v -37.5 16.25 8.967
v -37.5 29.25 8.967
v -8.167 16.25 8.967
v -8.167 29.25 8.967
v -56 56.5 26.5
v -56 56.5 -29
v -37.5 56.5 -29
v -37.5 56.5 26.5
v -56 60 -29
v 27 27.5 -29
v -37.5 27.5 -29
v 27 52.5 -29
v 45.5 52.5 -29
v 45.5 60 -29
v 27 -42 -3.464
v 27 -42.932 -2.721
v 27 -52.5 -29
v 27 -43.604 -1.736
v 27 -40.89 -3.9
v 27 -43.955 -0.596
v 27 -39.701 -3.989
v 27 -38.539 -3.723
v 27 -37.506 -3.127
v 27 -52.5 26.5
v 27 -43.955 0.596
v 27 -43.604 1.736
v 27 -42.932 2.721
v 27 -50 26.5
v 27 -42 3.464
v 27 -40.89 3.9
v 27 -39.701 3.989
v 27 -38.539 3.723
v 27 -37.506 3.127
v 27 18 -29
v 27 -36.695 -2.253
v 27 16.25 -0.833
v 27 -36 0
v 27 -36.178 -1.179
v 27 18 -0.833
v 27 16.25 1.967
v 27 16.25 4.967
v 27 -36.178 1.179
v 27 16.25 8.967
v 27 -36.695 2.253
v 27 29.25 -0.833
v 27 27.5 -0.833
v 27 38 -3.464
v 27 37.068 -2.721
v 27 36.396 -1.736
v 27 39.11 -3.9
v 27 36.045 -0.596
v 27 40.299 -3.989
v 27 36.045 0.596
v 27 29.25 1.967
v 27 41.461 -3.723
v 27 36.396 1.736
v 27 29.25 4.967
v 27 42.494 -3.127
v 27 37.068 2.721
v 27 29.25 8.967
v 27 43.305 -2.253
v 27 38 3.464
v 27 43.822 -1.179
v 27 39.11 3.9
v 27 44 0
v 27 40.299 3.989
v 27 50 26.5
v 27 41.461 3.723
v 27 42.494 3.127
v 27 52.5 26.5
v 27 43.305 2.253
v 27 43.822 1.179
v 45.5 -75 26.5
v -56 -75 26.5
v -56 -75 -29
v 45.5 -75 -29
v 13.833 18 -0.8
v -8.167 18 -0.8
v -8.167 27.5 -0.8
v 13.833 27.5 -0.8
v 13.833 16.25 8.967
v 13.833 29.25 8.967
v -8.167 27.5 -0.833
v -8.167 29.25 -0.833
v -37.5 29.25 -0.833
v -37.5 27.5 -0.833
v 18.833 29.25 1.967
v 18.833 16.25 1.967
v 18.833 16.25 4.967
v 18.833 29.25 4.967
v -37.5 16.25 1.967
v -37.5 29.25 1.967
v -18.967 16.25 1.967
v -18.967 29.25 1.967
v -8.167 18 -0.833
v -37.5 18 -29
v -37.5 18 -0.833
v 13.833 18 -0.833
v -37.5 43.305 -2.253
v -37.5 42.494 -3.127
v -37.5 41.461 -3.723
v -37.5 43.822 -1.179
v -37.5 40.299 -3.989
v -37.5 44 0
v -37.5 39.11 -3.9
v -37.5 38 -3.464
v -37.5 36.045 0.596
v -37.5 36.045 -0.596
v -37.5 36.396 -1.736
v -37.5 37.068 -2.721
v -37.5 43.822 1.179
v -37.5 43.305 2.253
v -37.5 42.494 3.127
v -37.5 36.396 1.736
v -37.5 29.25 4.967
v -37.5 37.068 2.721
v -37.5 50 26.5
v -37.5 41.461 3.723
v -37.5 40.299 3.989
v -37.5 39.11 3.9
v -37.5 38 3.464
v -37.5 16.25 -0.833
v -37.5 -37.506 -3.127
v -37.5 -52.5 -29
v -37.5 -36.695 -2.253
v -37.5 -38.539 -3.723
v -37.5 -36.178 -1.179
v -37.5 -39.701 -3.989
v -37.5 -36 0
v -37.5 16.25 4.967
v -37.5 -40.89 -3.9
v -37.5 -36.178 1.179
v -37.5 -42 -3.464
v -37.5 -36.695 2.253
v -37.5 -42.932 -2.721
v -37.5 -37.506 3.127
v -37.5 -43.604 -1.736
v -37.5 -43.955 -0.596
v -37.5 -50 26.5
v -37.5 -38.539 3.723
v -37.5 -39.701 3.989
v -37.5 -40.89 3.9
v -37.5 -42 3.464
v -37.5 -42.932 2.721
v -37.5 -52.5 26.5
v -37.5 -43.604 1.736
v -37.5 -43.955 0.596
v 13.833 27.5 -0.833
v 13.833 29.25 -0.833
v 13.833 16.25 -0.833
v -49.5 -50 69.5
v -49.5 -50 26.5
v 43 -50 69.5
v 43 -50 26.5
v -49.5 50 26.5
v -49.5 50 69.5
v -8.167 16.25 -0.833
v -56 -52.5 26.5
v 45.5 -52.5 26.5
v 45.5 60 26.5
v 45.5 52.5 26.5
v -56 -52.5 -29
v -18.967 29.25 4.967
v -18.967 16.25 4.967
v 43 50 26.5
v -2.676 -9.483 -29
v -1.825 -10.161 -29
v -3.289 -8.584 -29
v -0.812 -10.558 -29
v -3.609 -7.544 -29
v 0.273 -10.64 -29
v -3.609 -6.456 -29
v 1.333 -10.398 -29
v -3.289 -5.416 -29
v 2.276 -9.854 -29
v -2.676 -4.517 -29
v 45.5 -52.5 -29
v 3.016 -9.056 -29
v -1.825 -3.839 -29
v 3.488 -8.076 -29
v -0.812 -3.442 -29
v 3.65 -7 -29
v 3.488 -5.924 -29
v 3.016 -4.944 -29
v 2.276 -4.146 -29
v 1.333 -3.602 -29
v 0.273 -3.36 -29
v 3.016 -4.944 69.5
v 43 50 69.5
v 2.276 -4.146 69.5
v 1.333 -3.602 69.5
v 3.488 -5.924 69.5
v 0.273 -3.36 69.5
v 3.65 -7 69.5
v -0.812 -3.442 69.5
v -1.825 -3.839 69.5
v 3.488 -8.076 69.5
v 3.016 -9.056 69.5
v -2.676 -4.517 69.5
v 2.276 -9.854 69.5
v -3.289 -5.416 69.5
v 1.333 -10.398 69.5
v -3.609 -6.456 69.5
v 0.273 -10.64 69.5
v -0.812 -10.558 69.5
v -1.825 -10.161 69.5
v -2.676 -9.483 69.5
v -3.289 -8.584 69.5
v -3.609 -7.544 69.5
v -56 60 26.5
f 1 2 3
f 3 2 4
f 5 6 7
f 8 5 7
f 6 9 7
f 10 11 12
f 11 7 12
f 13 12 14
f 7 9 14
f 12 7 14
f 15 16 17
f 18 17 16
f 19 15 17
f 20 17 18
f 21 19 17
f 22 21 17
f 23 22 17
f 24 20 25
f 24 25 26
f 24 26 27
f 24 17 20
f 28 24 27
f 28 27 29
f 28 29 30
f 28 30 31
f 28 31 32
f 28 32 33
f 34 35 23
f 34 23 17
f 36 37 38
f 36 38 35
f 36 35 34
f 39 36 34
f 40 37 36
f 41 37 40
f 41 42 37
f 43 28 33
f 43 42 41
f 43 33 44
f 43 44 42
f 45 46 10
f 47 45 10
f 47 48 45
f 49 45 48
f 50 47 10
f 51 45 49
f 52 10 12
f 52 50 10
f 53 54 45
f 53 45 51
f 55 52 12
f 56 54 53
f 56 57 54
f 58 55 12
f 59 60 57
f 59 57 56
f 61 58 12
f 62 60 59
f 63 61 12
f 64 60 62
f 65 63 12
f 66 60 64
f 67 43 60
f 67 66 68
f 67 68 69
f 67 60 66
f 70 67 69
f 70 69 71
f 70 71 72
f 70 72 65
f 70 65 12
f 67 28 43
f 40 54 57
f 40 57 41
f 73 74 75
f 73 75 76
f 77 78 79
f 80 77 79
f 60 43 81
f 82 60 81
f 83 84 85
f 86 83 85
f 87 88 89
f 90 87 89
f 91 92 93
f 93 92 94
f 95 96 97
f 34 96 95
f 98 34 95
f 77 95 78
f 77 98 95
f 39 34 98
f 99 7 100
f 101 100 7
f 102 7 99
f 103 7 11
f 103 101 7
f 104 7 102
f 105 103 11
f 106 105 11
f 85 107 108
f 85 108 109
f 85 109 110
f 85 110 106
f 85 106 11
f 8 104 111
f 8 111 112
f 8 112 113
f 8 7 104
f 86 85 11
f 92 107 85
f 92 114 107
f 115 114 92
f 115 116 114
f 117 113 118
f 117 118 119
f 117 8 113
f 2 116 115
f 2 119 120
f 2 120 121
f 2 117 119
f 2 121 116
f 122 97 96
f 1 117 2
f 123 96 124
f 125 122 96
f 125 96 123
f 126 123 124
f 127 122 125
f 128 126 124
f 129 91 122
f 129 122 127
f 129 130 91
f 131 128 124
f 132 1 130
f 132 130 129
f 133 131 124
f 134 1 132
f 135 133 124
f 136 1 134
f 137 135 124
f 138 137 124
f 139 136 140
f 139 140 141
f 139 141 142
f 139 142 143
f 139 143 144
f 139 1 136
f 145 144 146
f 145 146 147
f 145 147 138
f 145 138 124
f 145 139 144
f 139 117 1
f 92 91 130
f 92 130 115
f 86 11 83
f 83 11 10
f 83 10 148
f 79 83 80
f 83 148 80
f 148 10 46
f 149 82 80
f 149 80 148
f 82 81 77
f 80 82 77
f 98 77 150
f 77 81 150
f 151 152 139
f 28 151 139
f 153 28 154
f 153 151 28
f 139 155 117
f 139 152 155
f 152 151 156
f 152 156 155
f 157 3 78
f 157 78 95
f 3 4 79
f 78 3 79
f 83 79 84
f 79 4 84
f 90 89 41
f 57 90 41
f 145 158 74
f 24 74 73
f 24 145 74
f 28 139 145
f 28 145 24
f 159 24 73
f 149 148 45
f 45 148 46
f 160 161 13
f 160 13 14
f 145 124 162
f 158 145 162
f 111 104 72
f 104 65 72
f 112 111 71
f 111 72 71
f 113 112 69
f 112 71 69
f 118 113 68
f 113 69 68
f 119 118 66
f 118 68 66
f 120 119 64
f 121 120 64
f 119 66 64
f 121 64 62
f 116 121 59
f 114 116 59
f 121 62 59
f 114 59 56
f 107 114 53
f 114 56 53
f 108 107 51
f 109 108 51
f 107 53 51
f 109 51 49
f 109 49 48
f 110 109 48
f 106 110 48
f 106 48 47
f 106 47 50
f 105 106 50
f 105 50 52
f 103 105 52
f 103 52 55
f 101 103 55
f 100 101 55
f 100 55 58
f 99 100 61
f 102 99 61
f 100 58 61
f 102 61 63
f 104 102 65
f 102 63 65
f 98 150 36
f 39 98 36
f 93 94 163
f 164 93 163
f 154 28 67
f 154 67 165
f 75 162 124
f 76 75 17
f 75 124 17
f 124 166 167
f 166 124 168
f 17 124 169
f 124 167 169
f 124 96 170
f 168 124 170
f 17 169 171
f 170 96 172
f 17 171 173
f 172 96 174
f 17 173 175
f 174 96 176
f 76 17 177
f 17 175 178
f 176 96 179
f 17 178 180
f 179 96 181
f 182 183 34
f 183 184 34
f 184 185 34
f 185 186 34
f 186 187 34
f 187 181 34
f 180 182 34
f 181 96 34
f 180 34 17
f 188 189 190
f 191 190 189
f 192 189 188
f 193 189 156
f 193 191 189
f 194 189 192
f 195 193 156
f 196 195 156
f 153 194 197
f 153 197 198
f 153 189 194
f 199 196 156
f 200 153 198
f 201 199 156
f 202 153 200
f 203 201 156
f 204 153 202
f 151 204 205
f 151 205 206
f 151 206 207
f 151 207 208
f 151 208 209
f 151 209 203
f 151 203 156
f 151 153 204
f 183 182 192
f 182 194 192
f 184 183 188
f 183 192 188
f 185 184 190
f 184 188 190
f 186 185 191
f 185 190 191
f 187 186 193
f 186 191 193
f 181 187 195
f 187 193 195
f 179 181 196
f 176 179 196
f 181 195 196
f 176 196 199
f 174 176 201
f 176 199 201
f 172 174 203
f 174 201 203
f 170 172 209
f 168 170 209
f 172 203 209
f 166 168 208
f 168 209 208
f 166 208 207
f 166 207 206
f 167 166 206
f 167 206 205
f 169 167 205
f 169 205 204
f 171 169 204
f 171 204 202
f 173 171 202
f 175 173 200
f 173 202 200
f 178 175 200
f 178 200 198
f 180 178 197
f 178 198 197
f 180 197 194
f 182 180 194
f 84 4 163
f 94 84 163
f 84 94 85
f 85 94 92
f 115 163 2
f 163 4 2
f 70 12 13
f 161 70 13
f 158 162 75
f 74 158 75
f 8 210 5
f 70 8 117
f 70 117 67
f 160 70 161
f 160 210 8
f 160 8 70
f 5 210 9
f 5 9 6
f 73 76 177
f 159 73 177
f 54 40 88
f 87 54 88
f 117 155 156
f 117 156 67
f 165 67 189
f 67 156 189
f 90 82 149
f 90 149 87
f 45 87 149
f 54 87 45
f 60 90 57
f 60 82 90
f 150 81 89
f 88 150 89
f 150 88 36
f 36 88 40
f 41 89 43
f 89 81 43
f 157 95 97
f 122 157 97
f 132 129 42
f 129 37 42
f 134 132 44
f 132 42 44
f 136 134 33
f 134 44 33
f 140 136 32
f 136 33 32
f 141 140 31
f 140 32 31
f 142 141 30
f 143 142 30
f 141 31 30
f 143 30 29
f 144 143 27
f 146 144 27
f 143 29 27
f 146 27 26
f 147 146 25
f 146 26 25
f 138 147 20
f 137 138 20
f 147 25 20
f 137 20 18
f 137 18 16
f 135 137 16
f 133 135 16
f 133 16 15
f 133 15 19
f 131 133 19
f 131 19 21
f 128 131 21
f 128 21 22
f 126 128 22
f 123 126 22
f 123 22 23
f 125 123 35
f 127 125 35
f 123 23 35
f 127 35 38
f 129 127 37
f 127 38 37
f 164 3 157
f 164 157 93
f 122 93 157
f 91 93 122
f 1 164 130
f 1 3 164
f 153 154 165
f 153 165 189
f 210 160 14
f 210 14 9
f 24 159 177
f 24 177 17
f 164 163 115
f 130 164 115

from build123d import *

# Parameters (mm, degrees)
PAD_DEPTH            = 50
PAD001_DEPTH         = 26.5
PAD001_DEPTH_BACK    = 29
SKETCH001_R          = 3.65
POCKET_DEPTH         = 0.501
POCKET_DEPTH_BACK    = -98.001
SKETCH002_R          = 4
SKETCH002_W          = 9.5
SKETCH002_H          = 30
POCKET001_DEPTH      = 56.001
POCKET001_DEPTH_BACK = -45.501
POCKET002_DEPTH      = 6.5


with BuildPart() as part:
    # Sketch → Pad (new body, symmetric)
    with BuildSketch(Plane.XZ):
        Polygon((-37.5, -28.5), (27, -28.5), (27, 26.5), (43, 26.5), (43, 69.5), (-49.5, 69.5), (-49.5, 26.5), (-37.5, 26.5), align=None)
    extrude(amount=PAD_DEPTH, both=True)

    # Sketch003 → Pad001 (join, two sides)
    with BuildSketch(Plane.XY) as pad001_sk:
        Polygon((-56, -52.5), (-56, -75), (45.5, -75), (45.5, -52.5), (27, -52.5), (27, 52.5), (45.5, 52.5), (45.5, 60), (-56, 60), (-56, 56.5), (-37.5, 56.5), (-37.5, -52.5), align=None)
    extrude(amount=PAD001_DEPTH)
    extrude(pad001_sk.sketch, amount=-PAD001_DEPTH_BACK)

    # Sketch001 → Pocket (cut, two sides)
    with BuildSketch(Plane.XY.offset(-28.5)) as pocket_sk:
        with Locations((0, -7)):
            Circle(SKETCH001_R)
    extrude(amount=-POCKET_DEPTH, mode=Mode.SUBTRACT)
    extrude(pocket_sk.sketch, amount=-POCKET_DEPTH_BACK, mode=Mode.SUBTRACT)

    # Sketch002 → Pocket001 (cut, two sides)
    with BuildSketch(Plane.YZ) as pocket001_sk:
        with Locations((-40, 0)):
            Circle(SKETCH002_R)
        with Locations((40, 0)):
            Circle(SKETCH002_R)
        with Locations((22.75, -15.8)):
            Rectangle(SKETCH002_W, SKETCH002_H)
    extrude(amount=-POCKET001_DEPTH, mode=Mode.SUBTRACT)
    extrude(pocket001_sk.sketch, amount=-POCKET001_DEPTH_BACK, mode=Mode.SUBTRACT)

    # Sketch004 (on DatumPlane) → Pocket002 (cut, symmetric)
    with BuildSketch(Plane(origin=(0.333333, 22.75, -10.033333), x_dir=(-1, 0, 0), z_dir=(0, 1, 0))):
        Polygon((-28.5, 19), (-13.5, 19), (-13.5, 9.2), (-28.5, 9.2), (-28.5, 12), (-18.5, 12), (-18.5, 15), (-28.5, 15), align=None)
        Polygon((38.5, 19), (8.5, 19), (8.5, 9.2), (38.5, 9.2), (38.5, 12), (19.3, 12), (19.3, 15), (38.5, 15), align=None)
    extrude(amount=POCKET002_DEPTH, both=True, mode=Mode.SUBTRACT)


solid = part.part
